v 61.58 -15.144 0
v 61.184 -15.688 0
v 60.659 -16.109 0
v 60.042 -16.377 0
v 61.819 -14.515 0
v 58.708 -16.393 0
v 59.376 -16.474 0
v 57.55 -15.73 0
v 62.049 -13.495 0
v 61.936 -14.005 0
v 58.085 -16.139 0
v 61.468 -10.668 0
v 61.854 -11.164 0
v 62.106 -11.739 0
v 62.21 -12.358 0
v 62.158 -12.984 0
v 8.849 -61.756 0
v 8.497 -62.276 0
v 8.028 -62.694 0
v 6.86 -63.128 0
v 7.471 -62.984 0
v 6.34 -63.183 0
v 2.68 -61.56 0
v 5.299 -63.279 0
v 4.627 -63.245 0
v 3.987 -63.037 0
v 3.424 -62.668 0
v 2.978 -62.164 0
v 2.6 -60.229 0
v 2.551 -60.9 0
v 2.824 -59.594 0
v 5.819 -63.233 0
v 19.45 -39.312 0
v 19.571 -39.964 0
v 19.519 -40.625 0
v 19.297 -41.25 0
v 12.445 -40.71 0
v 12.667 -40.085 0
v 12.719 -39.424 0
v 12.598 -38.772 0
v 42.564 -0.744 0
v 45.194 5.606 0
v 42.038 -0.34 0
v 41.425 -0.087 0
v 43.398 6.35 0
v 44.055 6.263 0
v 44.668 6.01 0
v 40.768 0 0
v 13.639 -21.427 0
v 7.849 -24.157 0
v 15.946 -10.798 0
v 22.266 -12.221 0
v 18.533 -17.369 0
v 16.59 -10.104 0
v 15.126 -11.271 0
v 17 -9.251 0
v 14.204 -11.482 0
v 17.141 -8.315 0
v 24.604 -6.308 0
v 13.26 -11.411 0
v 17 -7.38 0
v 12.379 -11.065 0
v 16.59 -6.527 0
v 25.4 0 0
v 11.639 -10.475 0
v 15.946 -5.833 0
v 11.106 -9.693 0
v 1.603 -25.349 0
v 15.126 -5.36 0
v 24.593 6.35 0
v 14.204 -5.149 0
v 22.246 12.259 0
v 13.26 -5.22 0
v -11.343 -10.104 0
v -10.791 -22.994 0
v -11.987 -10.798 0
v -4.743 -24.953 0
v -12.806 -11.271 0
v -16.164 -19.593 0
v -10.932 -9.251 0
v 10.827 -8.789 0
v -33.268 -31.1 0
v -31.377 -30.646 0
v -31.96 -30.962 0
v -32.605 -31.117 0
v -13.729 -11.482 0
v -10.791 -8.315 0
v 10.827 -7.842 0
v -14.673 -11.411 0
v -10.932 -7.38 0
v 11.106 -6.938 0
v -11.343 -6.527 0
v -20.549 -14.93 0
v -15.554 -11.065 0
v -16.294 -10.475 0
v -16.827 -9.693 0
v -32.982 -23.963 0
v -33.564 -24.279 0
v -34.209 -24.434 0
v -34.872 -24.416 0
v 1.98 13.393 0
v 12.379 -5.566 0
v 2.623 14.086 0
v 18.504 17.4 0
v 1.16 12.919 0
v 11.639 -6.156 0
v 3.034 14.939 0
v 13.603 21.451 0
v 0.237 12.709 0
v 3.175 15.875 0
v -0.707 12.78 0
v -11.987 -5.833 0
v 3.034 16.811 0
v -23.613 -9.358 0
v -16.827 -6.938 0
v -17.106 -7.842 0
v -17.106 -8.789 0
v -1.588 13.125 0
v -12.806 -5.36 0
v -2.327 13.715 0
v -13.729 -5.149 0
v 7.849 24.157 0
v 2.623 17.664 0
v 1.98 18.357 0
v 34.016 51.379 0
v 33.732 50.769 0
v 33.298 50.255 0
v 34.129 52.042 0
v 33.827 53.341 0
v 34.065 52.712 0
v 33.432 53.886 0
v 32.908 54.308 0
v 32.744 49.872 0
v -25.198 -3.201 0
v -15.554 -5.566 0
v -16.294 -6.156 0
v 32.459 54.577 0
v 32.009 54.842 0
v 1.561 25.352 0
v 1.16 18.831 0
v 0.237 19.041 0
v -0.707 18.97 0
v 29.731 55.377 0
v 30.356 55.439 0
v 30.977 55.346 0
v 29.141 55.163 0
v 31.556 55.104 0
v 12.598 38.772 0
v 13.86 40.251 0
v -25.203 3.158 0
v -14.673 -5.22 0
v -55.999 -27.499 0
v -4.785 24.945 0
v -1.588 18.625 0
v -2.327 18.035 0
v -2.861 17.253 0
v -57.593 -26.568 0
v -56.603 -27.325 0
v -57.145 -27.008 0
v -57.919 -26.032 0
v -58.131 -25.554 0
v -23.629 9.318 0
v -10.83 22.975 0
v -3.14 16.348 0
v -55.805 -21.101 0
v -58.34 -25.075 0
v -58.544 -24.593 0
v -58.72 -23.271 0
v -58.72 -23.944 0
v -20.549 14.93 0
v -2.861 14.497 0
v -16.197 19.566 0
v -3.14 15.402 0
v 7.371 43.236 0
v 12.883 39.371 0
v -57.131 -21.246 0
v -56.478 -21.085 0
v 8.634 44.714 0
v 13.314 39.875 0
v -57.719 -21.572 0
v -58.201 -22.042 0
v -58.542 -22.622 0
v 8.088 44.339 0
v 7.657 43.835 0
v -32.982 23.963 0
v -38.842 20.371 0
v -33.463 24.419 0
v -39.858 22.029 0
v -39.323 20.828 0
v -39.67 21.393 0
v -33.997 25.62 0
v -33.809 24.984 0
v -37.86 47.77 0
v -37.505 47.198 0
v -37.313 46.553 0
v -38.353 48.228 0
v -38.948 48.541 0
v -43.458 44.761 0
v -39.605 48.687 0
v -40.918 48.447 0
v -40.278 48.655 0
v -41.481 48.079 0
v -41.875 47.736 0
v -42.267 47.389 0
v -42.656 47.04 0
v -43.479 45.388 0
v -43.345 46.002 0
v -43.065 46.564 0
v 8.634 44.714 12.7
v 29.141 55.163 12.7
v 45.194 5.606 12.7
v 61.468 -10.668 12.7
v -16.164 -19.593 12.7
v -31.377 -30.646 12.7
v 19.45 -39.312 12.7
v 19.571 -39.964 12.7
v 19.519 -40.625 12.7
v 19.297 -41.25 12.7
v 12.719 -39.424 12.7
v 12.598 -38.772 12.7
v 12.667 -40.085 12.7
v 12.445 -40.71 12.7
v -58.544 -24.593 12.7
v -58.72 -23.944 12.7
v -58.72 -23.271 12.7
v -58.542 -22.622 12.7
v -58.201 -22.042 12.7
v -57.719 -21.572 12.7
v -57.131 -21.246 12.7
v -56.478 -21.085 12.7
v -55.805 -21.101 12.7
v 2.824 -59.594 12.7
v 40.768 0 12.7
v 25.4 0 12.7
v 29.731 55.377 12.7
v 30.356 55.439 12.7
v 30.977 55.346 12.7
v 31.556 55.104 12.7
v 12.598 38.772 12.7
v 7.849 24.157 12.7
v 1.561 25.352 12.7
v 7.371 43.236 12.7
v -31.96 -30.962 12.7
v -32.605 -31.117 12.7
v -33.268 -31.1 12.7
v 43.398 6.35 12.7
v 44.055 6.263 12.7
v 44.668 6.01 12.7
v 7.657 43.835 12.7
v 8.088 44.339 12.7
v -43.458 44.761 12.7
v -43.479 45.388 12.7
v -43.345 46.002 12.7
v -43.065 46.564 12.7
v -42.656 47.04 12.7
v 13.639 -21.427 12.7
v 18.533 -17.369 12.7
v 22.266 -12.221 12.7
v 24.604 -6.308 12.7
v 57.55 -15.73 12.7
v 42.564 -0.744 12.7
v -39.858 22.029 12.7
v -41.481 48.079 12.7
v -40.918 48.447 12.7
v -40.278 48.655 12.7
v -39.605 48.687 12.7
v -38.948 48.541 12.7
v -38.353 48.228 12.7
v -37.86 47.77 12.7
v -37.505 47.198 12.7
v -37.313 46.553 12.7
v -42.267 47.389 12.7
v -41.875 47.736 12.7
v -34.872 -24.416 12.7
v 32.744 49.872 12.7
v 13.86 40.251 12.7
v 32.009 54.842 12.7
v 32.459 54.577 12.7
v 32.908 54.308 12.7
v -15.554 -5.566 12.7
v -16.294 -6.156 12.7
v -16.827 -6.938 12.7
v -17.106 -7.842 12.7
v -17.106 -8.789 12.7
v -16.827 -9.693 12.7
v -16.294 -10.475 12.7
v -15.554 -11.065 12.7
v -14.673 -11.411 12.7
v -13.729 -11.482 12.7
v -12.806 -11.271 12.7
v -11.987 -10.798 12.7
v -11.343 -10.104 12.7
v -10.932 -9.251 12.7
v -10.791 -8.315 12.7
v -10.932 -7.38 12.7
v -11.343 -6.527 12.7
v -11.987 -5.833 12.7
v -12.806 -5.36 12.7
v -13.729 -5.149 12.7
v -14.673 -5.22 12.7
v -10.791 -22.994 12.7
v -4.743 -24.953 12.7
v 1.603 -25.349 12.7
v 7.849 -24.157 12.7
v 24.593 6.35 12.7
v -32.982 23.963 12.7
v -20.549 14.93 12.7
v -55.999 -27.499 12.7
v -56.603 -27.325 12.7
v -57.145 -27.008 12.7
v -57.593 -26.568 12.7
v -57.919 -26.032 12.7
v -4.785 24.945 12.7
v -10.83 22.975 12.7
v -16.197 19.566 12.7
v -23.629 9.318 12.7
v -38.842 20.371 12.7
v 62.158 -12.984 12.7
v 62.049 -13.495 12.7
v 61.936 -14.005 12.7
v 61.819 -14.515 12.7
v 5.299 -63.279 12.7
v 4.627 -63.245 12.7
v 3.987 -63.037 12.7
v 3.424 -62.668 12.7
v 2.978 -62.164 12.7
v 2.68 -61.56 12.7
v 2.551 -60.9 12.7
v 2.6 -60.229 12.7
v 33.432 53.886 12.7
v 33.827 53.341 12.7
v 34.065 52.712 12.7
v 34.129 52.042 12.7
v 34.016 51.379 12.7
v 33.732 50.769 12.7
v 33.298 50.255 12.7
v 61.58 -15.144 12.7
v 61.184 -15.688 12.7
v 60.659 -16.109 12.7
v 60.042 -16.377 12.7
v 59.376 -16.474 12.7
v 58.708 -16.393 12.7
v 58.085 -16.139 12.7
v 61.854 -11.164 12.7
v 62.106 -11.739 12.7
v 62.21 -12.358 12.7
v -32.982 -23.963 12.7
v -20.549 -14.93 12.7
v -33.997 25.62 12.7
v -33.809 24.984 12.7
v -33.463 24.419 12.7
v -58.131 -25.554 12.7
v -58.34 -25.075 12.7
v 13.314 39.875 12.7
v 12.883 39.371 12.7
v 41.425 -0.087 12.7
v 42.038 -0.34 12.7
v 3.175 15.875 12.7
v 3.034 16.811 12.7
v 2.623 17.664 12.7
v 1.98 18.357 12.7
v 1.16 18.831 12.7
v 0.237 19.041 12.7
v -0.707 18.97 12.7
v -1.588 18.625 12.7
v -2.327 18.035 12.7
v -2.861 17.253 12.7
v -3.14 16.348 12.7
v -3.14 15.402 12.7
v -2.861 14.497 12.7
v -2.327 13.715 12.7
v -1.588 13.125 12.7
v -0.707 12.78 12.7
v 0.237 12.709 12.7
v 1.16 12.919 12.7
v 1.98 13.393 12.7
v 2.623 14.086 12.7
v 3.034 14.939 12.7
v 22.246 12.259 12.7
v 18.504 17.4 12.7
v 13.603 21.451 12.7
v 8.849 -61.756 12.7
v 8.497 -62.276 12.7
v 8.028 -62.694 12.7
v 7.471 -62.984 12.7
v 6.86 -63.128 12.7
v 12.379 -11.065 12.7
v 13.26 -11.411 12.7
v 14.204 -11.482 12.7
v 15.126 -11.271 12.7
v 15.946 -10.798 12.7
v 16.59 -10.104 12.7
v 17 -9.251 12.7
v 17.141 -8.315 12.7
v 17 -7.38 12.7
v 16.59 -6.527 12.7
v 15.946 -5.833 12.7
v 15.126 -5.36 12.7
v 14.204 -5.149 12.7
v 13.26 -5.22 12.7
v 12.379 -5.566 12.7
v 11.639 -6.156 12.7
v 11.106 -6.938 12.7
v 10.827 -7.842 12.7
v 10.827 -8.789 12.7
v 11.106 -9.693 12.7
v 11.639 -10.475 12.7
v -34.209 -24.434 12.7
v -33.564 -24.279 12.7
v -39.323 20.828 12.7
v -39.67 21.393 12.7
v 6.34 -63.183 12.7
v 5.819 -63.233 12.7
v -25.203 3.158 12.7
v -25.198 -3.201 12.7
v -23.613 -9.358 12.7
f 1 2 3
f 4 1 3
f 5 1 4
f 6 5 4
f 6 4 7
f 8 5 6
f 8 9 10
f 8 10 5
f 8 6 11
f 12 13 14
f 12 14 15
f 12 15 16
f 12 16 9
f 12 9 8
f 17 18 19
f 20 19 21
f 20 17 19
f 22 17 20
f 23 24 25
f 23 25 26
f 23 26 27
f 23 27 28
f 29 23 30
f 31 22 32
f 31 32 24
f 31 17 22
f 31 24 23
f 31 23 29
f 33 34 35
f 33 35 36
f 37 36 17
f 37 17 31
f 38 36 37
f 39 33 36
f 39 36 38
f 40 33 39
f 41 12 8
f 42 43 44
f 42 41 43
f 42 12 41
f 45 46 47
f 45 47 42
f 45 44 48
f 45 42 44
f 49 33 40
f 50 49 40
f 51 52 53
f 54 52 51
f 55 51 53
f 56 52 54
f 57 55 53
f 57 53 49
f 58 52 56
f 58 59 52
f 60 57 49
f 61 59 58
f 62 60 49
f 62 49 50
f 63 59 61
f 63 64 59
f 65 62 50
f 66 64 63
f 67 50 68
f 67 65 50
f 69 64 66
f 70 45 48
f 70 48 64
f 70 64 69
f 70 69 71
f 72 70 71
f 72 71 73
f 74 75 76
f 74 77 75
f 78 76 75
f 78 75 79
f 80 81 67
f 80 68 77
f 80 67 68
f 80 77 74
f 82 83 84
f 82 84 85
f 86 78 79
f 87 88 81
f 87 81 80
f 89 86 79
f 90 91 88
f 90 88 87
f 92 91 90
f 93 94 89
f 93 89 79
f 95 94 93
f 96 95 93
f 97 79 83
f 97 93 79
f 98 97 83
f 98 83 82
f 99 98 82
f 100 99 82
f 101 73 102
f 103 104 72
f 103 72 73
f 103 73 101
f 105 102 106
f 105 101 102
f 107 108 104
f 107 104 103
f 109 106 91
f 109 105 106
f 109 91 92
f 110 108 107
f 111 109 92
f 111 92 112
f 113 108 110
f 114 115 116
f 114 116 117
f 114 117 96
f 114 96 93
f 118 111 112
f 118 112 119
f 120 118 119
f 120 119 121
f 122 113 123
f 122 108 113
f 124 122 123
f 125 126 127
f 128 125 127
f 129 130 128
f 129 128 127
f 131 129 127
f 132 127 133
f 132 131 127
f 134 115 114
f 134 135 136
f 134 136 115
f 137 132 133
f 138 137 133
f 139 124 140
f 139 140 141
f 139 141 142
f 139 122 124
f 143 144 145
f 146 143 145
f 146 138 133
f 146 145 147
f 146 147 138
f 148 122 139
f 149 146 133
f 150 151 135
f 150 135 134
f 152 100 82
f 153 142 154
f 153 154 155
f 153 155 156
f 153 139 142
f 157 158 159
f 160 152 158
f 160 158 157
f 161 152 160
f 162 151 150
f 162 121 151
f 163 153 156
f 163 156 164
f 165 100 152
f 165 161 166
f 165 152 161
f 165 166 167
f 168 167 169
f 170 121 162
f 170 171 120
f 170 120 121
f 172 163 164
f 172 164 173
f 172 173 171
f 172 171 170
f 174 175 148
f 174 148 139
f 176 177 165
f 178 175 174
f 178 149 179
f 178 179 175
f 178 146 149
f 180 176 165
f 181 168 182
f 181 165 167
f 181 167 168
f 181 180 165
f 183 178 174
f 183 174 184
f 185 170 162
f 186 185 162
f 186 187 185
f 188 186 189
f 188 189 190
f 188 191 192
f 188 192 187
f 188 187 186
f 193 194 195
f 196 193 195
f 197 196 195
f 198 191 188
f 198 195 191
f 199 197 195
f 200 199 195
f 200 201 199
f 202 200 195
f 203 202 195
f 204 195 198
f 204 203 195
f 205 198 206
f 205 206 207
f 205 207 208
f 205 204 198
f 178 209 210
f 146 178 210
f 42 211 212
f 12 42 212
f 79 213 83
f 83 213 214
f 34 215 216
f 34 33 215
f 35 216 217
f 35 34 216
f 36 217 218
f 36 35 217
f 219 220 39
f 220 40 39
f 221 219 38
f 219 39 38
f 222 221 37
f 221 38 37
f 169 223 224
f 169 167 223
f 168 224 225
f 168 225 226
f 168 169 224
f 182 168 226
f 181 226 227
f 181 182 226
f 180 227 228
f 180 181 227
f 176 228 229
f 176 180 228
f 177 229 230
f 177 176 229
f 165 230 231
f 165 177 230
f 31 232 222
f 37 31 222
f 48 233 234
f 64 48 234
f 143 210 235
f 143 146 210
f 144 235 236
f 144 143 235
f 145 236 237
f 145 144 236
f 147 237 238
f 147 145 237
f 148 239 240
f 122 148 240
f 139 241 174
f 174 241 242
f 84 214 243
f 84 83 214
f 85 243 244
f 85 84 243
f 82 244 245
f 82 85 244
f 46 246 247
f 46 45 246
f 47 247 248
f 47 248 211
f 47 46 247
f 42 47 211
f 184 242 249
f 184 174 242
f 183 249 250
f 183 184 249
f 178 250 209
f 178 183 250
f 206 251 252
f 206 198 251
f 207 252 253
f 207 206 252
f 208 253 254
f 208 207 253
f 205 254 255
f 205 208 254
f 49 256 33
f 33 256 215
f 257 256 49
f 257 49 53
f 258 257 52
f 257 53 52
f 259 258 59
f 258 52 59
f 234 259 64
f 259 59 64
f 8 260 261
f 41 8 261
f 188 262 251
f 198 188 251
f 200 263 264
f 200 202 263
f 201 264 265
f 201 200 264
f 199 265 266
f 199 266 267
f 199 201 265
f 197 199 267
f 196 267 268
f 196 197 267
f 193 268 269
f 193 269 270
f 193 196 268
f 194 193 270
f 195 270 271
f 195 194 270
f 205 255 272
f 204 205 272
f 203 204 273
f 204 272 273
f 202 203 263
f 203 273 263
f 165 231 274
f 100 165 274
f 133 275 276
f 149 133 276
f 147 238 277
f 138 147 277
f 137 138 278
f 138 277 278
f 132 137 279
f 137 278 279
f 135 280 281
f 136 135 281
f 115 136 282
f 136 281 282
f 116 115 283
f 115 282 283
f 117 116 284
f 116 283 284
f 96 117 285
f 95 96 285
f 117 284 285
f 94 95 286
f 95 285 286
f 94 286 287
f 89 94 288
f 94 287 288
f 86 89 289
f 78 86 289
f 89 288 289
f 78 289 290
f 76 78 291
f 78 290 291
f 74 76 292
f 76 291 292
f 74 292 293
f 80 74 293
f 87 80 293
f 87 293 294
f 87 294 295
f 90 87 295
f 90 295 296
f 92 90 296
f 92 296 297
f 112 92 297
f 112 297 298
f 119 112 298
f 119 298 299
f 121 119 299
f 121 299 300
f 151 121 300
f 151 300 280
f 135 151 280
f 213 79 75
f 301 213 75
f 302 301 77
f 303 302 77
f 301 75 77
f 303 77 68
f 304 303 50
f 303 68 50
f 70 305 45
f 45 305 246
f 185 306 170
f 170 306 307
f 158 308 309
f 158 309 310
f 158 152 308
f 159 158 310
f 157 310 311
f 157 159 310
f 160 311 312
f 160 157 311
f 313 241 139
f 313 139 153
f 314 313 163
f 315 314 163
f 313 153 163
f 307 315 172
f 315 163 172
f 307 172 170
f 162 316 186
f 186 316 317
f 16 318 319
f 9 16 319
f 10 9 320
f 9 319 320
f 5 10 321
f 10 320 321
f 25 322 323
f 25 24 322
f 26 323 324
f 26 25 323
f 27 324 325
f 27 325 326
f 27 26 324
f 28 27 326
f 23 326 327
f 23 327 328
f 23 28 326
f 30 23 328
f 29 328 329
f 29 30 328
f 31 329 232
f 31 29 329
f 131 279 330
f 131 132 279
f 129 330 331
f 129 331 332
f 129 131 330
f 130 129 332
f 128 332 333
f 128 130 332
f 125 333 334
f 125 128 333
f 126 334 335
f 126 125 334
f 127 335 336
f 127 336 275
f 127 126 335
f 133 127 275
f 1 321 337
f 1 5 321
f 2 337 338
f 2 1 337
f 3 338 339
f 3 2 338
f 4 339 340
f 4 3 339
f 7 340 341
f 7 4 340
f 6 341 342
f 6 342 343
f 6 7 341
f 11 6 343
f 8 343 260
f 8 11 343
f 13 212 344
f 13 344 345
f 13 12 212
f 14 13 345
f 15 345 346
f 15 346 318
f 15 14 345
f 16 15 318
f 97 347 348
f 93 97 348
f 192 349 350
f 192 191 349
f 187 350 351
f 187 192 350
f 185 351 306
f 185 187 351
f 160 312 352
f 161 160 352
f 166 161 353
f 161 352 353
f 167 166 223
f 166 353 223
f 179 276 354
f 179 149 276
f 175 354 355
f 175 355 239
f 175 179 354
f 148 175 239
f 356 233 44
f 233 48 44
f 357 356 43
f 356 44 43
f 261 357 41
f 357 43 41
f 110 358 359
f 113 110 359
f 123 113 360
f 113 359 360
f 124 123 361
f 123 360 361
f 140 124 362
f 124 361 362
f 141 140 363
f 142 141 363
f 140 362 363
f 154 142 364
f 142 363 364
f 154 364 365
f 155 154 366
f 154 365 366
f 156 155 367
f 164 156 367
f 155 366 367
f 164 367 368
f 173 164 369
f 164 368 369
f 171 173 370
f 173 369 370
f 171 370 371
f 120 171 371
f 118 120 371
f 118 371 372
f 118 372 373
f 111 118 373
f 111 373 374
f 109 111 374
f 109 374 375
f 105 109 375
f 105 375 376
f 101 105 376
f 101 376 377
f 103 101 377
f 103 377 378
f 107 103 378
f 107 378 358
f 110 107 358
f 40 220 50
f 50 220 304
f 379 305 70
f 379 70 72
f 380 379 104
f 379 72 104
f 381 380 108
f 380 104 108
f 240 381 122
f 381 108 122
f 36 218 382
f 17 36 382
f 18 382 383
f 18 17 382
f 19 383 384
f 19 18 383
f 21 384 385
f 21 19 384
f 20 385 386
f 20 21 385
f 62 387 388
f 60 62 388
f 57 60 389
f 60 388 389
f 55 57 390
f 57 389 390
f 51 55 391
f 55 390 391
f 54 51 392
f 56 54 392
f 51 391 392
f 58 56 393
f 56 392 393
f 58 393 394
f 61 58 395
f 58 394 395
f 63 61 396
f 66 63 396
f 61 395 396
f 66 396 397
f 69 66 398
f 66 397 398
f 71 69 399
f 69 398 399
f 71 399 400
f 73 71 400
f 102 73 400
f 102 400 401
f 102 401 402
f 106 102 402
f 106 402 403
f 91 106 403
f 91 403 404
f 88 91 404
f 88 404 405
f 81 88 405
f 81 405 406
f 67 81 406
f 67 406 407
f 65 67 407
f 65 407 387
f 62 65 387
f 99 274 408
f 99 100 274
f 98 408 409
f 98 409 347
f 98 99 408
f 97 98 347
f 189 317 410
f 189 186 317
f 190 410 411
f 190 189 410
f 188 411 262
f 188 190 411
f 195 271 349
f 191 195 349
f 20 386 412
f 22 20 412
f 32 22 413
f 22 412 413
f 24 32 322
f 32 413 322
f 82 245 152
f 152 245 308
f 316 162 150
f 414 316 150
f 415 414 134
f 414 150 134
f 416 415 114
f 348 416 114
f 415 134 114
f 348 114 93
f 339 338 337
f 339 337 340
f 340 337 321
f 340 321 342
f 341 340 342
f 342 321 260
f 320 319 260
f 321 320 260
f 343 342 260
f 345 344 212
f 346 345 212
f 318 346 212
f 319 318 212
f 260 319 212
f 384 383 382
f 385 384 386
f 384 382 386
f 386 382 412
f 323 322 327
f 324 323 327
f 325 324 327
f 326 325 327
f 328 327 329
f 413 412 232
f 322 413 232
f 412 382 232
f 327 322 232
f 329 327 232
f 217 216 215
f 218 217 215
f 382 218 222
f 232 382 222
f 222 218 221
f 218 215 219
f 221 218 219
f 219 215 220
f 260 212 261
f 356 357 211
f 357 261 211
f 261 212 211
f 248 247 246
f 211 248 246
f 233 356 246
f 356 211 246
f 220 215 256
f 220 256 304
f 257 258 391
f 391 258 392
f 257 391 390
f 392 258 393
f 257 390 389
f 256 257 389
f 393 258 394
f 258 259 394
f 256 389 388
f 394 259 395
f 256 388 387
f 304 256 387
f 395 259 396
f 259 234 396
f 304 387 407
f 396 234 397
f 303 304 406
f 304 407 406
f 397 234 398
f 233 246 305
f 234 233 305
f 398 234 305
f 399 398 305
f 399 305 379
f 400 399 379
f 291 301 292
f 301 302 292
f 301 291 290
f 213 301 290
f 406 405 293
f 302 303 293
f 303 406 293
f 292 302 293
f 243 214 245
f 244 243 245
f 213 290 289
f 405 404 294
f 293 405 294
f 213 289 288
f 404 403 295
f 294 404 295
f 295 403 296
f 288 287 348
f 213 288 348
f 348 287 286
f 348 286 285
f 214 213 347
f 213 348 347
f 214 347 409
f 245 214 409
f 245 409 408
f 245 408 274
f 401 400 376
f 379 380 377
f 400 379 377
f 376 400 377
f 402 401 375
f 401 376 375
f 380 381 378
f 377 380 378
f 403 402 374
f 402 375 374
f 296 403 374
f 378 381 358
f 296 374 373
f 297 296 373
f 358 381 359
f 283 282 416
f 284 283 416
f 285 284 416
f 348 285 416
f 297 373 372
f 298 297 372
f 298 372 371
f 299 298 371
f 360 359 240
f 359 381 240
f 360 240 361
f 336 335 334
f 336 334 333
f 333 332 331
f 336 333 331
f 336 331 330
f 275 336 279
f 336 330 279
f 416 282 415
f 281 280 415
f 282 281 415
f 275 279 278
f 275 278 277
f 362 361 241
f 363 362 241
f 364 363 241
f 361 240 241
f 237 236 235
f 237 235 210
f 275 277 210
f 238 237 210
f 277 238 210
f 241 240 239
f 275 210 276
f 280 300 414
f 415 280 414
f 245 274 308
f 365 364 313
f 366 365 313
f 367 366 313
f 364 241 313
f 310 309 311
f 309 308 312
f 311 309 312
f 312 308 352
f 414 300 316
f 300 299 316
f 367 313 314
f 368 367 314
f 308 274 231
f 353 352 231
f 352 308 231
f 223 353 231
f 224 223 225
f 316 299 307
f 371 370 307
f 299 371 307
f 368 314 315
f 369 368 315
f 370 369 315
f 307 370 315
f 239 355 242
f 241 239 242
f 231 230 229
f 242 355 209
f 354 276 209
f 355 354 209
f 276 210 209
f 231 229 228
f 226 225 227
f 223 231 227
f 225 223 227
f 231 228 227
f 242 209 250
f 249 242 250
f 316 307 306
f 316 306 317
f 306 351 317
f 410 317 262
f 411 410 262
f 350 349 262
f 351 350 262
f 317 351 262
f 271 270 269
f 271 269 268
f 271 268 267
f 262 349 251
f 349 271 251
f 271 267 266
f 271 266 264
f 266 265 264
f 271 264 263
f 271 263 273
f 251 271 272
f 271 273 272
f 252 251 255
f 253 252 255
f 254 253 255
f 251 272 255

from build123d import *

# Parameters (mm, degrees)
SKETCH1_R                = 25.4
HUB_MAIN_DEPTH           = 12.7
SKETCH2_R                = 3.175
HUB_BOLT_HOLES_DEPTH     = 13.7
CIRPATTERN1_COUNT        = 3
LEG_DEPTH                = 12.7
FILLET1_R                = 2.54
CIRPATTERN2_COUNT        = 5
FILLET1_OF_CIRPATTERN2_R = 2.54


with BuildPart() as part:
    # Sketch1 → Hub main (new body)
    with BuildSketch(Plane.XY):
        Circle(SKETCH1_R)
    extrude(amount=HUB_MAIN_DEPTH)

    # Sketch2 → Hub bolt holes (cut, through all)
    with BuildSketch(Plane.XY.offset(12.7)):
        with Locations((0, 15.875)):
            Circle(SKETCH2_R)
    hub_bolt_holes = extrude(amount=-HUB_BOLT_HOLES_DEPTH, mode=Mode.SUBTRACT)

    # CirPattern1: Hub bolt holes ×3 about axis
    cirpattern1_axis = Axis((0, -0.251984127, 0), (0, 0, 1))
    for i in range(1, CIRPATTERN1_COUNT):
        add(hub_bolt_holes.rotate(cirpattern1_axis, i * 360 / CIRPATTERN1_COUNT), mode=Mode.SUBTRACT)

    # Sketch4 → leg (add)
    with BuildSketch(Plane.XY.offset(12.7)):
        with BuildLine():
            Line((24.593444248, 6.35), (44.45, 6.35))
            Line((44.45, 6.35), (62.426544532, -11.626544532))
            ThreePointArc((62.426544532, -11.626544532), (61.641094588, -15.252064058), (60.645274989, -18.82553111))
            Line((60.645274989, -18.82553111), (41.819743879, 0))
            Line((41.819743879, 0), (25.4, 0))
            ThreePointArc((25.4, 0), (25.197554285, 3.200509029), (24.593444248, 6.35))
        make_face()
    leg = extrude(amount=-LEG_DEPTH)

    # Fillet1
    fillet1_edges = [part.edges().sort_by_distance(p)[0] for p in [
        (41.819743879, 0, 6.35),
        (44.45, 6.35, 6.35),
        (62.426544532, -11.626544532, 6.35),
        (60.645274989, -18.82553111, 6.35),
    ]]
    fillet(fillet1_edges, radius=FILLET1_R)

    # CirPattern2: leg ×5 about axis
    cirpattern2_axis = Axis((0, 0, 0), (0, 0, 1))
    for i in range(1, CIRPATTERN2_COUNT):
        add(leg.rotate(cirpattern2_axis, i * 360 / CIRPATTERN2_COUNT))

    # Fillet1 of CirPattern2
    fillet1_of_cirpattern2_edges = [part.edges().sort_by_distance(p)[0] for p in [
        (12.923011559, 39.772939926, 6.35),
        (7.696596521, 44.236720064, 6.35),
        (30.3483641, 55.778372121, 6.35),
        (36.644564635, 51.859674919, 6.35),
        (-33.832883498, 24.581028707, 6.35),
        (-39.693241752, 20.98979655, 6.35),
        (-43.670224016, 46.09947434, 6.35),
        (-37.997688541, 50.876572855, 6.35),
        (-33.832883498, -24.581028707, 6.35),
        (-32.228369048, -31.264312379, 6.35),
        (-57.338046838, -27.287330115, 6.35),
        (-60.128427647, -20.416223664, 6.35),
        (12.923011559, -39.772939926, 6.35),
        (19.775014278, -40.312204235, 6.35),
        (8.233362221, -62.963971814, 6.35),
        (0.836276565, -63.494493001, 6.35),
    ]]
    fillet(fillet1_of_cirpattern2_edges, radius=FILLET1_OF_CIRPATTERN2_R)


solid = part.part
